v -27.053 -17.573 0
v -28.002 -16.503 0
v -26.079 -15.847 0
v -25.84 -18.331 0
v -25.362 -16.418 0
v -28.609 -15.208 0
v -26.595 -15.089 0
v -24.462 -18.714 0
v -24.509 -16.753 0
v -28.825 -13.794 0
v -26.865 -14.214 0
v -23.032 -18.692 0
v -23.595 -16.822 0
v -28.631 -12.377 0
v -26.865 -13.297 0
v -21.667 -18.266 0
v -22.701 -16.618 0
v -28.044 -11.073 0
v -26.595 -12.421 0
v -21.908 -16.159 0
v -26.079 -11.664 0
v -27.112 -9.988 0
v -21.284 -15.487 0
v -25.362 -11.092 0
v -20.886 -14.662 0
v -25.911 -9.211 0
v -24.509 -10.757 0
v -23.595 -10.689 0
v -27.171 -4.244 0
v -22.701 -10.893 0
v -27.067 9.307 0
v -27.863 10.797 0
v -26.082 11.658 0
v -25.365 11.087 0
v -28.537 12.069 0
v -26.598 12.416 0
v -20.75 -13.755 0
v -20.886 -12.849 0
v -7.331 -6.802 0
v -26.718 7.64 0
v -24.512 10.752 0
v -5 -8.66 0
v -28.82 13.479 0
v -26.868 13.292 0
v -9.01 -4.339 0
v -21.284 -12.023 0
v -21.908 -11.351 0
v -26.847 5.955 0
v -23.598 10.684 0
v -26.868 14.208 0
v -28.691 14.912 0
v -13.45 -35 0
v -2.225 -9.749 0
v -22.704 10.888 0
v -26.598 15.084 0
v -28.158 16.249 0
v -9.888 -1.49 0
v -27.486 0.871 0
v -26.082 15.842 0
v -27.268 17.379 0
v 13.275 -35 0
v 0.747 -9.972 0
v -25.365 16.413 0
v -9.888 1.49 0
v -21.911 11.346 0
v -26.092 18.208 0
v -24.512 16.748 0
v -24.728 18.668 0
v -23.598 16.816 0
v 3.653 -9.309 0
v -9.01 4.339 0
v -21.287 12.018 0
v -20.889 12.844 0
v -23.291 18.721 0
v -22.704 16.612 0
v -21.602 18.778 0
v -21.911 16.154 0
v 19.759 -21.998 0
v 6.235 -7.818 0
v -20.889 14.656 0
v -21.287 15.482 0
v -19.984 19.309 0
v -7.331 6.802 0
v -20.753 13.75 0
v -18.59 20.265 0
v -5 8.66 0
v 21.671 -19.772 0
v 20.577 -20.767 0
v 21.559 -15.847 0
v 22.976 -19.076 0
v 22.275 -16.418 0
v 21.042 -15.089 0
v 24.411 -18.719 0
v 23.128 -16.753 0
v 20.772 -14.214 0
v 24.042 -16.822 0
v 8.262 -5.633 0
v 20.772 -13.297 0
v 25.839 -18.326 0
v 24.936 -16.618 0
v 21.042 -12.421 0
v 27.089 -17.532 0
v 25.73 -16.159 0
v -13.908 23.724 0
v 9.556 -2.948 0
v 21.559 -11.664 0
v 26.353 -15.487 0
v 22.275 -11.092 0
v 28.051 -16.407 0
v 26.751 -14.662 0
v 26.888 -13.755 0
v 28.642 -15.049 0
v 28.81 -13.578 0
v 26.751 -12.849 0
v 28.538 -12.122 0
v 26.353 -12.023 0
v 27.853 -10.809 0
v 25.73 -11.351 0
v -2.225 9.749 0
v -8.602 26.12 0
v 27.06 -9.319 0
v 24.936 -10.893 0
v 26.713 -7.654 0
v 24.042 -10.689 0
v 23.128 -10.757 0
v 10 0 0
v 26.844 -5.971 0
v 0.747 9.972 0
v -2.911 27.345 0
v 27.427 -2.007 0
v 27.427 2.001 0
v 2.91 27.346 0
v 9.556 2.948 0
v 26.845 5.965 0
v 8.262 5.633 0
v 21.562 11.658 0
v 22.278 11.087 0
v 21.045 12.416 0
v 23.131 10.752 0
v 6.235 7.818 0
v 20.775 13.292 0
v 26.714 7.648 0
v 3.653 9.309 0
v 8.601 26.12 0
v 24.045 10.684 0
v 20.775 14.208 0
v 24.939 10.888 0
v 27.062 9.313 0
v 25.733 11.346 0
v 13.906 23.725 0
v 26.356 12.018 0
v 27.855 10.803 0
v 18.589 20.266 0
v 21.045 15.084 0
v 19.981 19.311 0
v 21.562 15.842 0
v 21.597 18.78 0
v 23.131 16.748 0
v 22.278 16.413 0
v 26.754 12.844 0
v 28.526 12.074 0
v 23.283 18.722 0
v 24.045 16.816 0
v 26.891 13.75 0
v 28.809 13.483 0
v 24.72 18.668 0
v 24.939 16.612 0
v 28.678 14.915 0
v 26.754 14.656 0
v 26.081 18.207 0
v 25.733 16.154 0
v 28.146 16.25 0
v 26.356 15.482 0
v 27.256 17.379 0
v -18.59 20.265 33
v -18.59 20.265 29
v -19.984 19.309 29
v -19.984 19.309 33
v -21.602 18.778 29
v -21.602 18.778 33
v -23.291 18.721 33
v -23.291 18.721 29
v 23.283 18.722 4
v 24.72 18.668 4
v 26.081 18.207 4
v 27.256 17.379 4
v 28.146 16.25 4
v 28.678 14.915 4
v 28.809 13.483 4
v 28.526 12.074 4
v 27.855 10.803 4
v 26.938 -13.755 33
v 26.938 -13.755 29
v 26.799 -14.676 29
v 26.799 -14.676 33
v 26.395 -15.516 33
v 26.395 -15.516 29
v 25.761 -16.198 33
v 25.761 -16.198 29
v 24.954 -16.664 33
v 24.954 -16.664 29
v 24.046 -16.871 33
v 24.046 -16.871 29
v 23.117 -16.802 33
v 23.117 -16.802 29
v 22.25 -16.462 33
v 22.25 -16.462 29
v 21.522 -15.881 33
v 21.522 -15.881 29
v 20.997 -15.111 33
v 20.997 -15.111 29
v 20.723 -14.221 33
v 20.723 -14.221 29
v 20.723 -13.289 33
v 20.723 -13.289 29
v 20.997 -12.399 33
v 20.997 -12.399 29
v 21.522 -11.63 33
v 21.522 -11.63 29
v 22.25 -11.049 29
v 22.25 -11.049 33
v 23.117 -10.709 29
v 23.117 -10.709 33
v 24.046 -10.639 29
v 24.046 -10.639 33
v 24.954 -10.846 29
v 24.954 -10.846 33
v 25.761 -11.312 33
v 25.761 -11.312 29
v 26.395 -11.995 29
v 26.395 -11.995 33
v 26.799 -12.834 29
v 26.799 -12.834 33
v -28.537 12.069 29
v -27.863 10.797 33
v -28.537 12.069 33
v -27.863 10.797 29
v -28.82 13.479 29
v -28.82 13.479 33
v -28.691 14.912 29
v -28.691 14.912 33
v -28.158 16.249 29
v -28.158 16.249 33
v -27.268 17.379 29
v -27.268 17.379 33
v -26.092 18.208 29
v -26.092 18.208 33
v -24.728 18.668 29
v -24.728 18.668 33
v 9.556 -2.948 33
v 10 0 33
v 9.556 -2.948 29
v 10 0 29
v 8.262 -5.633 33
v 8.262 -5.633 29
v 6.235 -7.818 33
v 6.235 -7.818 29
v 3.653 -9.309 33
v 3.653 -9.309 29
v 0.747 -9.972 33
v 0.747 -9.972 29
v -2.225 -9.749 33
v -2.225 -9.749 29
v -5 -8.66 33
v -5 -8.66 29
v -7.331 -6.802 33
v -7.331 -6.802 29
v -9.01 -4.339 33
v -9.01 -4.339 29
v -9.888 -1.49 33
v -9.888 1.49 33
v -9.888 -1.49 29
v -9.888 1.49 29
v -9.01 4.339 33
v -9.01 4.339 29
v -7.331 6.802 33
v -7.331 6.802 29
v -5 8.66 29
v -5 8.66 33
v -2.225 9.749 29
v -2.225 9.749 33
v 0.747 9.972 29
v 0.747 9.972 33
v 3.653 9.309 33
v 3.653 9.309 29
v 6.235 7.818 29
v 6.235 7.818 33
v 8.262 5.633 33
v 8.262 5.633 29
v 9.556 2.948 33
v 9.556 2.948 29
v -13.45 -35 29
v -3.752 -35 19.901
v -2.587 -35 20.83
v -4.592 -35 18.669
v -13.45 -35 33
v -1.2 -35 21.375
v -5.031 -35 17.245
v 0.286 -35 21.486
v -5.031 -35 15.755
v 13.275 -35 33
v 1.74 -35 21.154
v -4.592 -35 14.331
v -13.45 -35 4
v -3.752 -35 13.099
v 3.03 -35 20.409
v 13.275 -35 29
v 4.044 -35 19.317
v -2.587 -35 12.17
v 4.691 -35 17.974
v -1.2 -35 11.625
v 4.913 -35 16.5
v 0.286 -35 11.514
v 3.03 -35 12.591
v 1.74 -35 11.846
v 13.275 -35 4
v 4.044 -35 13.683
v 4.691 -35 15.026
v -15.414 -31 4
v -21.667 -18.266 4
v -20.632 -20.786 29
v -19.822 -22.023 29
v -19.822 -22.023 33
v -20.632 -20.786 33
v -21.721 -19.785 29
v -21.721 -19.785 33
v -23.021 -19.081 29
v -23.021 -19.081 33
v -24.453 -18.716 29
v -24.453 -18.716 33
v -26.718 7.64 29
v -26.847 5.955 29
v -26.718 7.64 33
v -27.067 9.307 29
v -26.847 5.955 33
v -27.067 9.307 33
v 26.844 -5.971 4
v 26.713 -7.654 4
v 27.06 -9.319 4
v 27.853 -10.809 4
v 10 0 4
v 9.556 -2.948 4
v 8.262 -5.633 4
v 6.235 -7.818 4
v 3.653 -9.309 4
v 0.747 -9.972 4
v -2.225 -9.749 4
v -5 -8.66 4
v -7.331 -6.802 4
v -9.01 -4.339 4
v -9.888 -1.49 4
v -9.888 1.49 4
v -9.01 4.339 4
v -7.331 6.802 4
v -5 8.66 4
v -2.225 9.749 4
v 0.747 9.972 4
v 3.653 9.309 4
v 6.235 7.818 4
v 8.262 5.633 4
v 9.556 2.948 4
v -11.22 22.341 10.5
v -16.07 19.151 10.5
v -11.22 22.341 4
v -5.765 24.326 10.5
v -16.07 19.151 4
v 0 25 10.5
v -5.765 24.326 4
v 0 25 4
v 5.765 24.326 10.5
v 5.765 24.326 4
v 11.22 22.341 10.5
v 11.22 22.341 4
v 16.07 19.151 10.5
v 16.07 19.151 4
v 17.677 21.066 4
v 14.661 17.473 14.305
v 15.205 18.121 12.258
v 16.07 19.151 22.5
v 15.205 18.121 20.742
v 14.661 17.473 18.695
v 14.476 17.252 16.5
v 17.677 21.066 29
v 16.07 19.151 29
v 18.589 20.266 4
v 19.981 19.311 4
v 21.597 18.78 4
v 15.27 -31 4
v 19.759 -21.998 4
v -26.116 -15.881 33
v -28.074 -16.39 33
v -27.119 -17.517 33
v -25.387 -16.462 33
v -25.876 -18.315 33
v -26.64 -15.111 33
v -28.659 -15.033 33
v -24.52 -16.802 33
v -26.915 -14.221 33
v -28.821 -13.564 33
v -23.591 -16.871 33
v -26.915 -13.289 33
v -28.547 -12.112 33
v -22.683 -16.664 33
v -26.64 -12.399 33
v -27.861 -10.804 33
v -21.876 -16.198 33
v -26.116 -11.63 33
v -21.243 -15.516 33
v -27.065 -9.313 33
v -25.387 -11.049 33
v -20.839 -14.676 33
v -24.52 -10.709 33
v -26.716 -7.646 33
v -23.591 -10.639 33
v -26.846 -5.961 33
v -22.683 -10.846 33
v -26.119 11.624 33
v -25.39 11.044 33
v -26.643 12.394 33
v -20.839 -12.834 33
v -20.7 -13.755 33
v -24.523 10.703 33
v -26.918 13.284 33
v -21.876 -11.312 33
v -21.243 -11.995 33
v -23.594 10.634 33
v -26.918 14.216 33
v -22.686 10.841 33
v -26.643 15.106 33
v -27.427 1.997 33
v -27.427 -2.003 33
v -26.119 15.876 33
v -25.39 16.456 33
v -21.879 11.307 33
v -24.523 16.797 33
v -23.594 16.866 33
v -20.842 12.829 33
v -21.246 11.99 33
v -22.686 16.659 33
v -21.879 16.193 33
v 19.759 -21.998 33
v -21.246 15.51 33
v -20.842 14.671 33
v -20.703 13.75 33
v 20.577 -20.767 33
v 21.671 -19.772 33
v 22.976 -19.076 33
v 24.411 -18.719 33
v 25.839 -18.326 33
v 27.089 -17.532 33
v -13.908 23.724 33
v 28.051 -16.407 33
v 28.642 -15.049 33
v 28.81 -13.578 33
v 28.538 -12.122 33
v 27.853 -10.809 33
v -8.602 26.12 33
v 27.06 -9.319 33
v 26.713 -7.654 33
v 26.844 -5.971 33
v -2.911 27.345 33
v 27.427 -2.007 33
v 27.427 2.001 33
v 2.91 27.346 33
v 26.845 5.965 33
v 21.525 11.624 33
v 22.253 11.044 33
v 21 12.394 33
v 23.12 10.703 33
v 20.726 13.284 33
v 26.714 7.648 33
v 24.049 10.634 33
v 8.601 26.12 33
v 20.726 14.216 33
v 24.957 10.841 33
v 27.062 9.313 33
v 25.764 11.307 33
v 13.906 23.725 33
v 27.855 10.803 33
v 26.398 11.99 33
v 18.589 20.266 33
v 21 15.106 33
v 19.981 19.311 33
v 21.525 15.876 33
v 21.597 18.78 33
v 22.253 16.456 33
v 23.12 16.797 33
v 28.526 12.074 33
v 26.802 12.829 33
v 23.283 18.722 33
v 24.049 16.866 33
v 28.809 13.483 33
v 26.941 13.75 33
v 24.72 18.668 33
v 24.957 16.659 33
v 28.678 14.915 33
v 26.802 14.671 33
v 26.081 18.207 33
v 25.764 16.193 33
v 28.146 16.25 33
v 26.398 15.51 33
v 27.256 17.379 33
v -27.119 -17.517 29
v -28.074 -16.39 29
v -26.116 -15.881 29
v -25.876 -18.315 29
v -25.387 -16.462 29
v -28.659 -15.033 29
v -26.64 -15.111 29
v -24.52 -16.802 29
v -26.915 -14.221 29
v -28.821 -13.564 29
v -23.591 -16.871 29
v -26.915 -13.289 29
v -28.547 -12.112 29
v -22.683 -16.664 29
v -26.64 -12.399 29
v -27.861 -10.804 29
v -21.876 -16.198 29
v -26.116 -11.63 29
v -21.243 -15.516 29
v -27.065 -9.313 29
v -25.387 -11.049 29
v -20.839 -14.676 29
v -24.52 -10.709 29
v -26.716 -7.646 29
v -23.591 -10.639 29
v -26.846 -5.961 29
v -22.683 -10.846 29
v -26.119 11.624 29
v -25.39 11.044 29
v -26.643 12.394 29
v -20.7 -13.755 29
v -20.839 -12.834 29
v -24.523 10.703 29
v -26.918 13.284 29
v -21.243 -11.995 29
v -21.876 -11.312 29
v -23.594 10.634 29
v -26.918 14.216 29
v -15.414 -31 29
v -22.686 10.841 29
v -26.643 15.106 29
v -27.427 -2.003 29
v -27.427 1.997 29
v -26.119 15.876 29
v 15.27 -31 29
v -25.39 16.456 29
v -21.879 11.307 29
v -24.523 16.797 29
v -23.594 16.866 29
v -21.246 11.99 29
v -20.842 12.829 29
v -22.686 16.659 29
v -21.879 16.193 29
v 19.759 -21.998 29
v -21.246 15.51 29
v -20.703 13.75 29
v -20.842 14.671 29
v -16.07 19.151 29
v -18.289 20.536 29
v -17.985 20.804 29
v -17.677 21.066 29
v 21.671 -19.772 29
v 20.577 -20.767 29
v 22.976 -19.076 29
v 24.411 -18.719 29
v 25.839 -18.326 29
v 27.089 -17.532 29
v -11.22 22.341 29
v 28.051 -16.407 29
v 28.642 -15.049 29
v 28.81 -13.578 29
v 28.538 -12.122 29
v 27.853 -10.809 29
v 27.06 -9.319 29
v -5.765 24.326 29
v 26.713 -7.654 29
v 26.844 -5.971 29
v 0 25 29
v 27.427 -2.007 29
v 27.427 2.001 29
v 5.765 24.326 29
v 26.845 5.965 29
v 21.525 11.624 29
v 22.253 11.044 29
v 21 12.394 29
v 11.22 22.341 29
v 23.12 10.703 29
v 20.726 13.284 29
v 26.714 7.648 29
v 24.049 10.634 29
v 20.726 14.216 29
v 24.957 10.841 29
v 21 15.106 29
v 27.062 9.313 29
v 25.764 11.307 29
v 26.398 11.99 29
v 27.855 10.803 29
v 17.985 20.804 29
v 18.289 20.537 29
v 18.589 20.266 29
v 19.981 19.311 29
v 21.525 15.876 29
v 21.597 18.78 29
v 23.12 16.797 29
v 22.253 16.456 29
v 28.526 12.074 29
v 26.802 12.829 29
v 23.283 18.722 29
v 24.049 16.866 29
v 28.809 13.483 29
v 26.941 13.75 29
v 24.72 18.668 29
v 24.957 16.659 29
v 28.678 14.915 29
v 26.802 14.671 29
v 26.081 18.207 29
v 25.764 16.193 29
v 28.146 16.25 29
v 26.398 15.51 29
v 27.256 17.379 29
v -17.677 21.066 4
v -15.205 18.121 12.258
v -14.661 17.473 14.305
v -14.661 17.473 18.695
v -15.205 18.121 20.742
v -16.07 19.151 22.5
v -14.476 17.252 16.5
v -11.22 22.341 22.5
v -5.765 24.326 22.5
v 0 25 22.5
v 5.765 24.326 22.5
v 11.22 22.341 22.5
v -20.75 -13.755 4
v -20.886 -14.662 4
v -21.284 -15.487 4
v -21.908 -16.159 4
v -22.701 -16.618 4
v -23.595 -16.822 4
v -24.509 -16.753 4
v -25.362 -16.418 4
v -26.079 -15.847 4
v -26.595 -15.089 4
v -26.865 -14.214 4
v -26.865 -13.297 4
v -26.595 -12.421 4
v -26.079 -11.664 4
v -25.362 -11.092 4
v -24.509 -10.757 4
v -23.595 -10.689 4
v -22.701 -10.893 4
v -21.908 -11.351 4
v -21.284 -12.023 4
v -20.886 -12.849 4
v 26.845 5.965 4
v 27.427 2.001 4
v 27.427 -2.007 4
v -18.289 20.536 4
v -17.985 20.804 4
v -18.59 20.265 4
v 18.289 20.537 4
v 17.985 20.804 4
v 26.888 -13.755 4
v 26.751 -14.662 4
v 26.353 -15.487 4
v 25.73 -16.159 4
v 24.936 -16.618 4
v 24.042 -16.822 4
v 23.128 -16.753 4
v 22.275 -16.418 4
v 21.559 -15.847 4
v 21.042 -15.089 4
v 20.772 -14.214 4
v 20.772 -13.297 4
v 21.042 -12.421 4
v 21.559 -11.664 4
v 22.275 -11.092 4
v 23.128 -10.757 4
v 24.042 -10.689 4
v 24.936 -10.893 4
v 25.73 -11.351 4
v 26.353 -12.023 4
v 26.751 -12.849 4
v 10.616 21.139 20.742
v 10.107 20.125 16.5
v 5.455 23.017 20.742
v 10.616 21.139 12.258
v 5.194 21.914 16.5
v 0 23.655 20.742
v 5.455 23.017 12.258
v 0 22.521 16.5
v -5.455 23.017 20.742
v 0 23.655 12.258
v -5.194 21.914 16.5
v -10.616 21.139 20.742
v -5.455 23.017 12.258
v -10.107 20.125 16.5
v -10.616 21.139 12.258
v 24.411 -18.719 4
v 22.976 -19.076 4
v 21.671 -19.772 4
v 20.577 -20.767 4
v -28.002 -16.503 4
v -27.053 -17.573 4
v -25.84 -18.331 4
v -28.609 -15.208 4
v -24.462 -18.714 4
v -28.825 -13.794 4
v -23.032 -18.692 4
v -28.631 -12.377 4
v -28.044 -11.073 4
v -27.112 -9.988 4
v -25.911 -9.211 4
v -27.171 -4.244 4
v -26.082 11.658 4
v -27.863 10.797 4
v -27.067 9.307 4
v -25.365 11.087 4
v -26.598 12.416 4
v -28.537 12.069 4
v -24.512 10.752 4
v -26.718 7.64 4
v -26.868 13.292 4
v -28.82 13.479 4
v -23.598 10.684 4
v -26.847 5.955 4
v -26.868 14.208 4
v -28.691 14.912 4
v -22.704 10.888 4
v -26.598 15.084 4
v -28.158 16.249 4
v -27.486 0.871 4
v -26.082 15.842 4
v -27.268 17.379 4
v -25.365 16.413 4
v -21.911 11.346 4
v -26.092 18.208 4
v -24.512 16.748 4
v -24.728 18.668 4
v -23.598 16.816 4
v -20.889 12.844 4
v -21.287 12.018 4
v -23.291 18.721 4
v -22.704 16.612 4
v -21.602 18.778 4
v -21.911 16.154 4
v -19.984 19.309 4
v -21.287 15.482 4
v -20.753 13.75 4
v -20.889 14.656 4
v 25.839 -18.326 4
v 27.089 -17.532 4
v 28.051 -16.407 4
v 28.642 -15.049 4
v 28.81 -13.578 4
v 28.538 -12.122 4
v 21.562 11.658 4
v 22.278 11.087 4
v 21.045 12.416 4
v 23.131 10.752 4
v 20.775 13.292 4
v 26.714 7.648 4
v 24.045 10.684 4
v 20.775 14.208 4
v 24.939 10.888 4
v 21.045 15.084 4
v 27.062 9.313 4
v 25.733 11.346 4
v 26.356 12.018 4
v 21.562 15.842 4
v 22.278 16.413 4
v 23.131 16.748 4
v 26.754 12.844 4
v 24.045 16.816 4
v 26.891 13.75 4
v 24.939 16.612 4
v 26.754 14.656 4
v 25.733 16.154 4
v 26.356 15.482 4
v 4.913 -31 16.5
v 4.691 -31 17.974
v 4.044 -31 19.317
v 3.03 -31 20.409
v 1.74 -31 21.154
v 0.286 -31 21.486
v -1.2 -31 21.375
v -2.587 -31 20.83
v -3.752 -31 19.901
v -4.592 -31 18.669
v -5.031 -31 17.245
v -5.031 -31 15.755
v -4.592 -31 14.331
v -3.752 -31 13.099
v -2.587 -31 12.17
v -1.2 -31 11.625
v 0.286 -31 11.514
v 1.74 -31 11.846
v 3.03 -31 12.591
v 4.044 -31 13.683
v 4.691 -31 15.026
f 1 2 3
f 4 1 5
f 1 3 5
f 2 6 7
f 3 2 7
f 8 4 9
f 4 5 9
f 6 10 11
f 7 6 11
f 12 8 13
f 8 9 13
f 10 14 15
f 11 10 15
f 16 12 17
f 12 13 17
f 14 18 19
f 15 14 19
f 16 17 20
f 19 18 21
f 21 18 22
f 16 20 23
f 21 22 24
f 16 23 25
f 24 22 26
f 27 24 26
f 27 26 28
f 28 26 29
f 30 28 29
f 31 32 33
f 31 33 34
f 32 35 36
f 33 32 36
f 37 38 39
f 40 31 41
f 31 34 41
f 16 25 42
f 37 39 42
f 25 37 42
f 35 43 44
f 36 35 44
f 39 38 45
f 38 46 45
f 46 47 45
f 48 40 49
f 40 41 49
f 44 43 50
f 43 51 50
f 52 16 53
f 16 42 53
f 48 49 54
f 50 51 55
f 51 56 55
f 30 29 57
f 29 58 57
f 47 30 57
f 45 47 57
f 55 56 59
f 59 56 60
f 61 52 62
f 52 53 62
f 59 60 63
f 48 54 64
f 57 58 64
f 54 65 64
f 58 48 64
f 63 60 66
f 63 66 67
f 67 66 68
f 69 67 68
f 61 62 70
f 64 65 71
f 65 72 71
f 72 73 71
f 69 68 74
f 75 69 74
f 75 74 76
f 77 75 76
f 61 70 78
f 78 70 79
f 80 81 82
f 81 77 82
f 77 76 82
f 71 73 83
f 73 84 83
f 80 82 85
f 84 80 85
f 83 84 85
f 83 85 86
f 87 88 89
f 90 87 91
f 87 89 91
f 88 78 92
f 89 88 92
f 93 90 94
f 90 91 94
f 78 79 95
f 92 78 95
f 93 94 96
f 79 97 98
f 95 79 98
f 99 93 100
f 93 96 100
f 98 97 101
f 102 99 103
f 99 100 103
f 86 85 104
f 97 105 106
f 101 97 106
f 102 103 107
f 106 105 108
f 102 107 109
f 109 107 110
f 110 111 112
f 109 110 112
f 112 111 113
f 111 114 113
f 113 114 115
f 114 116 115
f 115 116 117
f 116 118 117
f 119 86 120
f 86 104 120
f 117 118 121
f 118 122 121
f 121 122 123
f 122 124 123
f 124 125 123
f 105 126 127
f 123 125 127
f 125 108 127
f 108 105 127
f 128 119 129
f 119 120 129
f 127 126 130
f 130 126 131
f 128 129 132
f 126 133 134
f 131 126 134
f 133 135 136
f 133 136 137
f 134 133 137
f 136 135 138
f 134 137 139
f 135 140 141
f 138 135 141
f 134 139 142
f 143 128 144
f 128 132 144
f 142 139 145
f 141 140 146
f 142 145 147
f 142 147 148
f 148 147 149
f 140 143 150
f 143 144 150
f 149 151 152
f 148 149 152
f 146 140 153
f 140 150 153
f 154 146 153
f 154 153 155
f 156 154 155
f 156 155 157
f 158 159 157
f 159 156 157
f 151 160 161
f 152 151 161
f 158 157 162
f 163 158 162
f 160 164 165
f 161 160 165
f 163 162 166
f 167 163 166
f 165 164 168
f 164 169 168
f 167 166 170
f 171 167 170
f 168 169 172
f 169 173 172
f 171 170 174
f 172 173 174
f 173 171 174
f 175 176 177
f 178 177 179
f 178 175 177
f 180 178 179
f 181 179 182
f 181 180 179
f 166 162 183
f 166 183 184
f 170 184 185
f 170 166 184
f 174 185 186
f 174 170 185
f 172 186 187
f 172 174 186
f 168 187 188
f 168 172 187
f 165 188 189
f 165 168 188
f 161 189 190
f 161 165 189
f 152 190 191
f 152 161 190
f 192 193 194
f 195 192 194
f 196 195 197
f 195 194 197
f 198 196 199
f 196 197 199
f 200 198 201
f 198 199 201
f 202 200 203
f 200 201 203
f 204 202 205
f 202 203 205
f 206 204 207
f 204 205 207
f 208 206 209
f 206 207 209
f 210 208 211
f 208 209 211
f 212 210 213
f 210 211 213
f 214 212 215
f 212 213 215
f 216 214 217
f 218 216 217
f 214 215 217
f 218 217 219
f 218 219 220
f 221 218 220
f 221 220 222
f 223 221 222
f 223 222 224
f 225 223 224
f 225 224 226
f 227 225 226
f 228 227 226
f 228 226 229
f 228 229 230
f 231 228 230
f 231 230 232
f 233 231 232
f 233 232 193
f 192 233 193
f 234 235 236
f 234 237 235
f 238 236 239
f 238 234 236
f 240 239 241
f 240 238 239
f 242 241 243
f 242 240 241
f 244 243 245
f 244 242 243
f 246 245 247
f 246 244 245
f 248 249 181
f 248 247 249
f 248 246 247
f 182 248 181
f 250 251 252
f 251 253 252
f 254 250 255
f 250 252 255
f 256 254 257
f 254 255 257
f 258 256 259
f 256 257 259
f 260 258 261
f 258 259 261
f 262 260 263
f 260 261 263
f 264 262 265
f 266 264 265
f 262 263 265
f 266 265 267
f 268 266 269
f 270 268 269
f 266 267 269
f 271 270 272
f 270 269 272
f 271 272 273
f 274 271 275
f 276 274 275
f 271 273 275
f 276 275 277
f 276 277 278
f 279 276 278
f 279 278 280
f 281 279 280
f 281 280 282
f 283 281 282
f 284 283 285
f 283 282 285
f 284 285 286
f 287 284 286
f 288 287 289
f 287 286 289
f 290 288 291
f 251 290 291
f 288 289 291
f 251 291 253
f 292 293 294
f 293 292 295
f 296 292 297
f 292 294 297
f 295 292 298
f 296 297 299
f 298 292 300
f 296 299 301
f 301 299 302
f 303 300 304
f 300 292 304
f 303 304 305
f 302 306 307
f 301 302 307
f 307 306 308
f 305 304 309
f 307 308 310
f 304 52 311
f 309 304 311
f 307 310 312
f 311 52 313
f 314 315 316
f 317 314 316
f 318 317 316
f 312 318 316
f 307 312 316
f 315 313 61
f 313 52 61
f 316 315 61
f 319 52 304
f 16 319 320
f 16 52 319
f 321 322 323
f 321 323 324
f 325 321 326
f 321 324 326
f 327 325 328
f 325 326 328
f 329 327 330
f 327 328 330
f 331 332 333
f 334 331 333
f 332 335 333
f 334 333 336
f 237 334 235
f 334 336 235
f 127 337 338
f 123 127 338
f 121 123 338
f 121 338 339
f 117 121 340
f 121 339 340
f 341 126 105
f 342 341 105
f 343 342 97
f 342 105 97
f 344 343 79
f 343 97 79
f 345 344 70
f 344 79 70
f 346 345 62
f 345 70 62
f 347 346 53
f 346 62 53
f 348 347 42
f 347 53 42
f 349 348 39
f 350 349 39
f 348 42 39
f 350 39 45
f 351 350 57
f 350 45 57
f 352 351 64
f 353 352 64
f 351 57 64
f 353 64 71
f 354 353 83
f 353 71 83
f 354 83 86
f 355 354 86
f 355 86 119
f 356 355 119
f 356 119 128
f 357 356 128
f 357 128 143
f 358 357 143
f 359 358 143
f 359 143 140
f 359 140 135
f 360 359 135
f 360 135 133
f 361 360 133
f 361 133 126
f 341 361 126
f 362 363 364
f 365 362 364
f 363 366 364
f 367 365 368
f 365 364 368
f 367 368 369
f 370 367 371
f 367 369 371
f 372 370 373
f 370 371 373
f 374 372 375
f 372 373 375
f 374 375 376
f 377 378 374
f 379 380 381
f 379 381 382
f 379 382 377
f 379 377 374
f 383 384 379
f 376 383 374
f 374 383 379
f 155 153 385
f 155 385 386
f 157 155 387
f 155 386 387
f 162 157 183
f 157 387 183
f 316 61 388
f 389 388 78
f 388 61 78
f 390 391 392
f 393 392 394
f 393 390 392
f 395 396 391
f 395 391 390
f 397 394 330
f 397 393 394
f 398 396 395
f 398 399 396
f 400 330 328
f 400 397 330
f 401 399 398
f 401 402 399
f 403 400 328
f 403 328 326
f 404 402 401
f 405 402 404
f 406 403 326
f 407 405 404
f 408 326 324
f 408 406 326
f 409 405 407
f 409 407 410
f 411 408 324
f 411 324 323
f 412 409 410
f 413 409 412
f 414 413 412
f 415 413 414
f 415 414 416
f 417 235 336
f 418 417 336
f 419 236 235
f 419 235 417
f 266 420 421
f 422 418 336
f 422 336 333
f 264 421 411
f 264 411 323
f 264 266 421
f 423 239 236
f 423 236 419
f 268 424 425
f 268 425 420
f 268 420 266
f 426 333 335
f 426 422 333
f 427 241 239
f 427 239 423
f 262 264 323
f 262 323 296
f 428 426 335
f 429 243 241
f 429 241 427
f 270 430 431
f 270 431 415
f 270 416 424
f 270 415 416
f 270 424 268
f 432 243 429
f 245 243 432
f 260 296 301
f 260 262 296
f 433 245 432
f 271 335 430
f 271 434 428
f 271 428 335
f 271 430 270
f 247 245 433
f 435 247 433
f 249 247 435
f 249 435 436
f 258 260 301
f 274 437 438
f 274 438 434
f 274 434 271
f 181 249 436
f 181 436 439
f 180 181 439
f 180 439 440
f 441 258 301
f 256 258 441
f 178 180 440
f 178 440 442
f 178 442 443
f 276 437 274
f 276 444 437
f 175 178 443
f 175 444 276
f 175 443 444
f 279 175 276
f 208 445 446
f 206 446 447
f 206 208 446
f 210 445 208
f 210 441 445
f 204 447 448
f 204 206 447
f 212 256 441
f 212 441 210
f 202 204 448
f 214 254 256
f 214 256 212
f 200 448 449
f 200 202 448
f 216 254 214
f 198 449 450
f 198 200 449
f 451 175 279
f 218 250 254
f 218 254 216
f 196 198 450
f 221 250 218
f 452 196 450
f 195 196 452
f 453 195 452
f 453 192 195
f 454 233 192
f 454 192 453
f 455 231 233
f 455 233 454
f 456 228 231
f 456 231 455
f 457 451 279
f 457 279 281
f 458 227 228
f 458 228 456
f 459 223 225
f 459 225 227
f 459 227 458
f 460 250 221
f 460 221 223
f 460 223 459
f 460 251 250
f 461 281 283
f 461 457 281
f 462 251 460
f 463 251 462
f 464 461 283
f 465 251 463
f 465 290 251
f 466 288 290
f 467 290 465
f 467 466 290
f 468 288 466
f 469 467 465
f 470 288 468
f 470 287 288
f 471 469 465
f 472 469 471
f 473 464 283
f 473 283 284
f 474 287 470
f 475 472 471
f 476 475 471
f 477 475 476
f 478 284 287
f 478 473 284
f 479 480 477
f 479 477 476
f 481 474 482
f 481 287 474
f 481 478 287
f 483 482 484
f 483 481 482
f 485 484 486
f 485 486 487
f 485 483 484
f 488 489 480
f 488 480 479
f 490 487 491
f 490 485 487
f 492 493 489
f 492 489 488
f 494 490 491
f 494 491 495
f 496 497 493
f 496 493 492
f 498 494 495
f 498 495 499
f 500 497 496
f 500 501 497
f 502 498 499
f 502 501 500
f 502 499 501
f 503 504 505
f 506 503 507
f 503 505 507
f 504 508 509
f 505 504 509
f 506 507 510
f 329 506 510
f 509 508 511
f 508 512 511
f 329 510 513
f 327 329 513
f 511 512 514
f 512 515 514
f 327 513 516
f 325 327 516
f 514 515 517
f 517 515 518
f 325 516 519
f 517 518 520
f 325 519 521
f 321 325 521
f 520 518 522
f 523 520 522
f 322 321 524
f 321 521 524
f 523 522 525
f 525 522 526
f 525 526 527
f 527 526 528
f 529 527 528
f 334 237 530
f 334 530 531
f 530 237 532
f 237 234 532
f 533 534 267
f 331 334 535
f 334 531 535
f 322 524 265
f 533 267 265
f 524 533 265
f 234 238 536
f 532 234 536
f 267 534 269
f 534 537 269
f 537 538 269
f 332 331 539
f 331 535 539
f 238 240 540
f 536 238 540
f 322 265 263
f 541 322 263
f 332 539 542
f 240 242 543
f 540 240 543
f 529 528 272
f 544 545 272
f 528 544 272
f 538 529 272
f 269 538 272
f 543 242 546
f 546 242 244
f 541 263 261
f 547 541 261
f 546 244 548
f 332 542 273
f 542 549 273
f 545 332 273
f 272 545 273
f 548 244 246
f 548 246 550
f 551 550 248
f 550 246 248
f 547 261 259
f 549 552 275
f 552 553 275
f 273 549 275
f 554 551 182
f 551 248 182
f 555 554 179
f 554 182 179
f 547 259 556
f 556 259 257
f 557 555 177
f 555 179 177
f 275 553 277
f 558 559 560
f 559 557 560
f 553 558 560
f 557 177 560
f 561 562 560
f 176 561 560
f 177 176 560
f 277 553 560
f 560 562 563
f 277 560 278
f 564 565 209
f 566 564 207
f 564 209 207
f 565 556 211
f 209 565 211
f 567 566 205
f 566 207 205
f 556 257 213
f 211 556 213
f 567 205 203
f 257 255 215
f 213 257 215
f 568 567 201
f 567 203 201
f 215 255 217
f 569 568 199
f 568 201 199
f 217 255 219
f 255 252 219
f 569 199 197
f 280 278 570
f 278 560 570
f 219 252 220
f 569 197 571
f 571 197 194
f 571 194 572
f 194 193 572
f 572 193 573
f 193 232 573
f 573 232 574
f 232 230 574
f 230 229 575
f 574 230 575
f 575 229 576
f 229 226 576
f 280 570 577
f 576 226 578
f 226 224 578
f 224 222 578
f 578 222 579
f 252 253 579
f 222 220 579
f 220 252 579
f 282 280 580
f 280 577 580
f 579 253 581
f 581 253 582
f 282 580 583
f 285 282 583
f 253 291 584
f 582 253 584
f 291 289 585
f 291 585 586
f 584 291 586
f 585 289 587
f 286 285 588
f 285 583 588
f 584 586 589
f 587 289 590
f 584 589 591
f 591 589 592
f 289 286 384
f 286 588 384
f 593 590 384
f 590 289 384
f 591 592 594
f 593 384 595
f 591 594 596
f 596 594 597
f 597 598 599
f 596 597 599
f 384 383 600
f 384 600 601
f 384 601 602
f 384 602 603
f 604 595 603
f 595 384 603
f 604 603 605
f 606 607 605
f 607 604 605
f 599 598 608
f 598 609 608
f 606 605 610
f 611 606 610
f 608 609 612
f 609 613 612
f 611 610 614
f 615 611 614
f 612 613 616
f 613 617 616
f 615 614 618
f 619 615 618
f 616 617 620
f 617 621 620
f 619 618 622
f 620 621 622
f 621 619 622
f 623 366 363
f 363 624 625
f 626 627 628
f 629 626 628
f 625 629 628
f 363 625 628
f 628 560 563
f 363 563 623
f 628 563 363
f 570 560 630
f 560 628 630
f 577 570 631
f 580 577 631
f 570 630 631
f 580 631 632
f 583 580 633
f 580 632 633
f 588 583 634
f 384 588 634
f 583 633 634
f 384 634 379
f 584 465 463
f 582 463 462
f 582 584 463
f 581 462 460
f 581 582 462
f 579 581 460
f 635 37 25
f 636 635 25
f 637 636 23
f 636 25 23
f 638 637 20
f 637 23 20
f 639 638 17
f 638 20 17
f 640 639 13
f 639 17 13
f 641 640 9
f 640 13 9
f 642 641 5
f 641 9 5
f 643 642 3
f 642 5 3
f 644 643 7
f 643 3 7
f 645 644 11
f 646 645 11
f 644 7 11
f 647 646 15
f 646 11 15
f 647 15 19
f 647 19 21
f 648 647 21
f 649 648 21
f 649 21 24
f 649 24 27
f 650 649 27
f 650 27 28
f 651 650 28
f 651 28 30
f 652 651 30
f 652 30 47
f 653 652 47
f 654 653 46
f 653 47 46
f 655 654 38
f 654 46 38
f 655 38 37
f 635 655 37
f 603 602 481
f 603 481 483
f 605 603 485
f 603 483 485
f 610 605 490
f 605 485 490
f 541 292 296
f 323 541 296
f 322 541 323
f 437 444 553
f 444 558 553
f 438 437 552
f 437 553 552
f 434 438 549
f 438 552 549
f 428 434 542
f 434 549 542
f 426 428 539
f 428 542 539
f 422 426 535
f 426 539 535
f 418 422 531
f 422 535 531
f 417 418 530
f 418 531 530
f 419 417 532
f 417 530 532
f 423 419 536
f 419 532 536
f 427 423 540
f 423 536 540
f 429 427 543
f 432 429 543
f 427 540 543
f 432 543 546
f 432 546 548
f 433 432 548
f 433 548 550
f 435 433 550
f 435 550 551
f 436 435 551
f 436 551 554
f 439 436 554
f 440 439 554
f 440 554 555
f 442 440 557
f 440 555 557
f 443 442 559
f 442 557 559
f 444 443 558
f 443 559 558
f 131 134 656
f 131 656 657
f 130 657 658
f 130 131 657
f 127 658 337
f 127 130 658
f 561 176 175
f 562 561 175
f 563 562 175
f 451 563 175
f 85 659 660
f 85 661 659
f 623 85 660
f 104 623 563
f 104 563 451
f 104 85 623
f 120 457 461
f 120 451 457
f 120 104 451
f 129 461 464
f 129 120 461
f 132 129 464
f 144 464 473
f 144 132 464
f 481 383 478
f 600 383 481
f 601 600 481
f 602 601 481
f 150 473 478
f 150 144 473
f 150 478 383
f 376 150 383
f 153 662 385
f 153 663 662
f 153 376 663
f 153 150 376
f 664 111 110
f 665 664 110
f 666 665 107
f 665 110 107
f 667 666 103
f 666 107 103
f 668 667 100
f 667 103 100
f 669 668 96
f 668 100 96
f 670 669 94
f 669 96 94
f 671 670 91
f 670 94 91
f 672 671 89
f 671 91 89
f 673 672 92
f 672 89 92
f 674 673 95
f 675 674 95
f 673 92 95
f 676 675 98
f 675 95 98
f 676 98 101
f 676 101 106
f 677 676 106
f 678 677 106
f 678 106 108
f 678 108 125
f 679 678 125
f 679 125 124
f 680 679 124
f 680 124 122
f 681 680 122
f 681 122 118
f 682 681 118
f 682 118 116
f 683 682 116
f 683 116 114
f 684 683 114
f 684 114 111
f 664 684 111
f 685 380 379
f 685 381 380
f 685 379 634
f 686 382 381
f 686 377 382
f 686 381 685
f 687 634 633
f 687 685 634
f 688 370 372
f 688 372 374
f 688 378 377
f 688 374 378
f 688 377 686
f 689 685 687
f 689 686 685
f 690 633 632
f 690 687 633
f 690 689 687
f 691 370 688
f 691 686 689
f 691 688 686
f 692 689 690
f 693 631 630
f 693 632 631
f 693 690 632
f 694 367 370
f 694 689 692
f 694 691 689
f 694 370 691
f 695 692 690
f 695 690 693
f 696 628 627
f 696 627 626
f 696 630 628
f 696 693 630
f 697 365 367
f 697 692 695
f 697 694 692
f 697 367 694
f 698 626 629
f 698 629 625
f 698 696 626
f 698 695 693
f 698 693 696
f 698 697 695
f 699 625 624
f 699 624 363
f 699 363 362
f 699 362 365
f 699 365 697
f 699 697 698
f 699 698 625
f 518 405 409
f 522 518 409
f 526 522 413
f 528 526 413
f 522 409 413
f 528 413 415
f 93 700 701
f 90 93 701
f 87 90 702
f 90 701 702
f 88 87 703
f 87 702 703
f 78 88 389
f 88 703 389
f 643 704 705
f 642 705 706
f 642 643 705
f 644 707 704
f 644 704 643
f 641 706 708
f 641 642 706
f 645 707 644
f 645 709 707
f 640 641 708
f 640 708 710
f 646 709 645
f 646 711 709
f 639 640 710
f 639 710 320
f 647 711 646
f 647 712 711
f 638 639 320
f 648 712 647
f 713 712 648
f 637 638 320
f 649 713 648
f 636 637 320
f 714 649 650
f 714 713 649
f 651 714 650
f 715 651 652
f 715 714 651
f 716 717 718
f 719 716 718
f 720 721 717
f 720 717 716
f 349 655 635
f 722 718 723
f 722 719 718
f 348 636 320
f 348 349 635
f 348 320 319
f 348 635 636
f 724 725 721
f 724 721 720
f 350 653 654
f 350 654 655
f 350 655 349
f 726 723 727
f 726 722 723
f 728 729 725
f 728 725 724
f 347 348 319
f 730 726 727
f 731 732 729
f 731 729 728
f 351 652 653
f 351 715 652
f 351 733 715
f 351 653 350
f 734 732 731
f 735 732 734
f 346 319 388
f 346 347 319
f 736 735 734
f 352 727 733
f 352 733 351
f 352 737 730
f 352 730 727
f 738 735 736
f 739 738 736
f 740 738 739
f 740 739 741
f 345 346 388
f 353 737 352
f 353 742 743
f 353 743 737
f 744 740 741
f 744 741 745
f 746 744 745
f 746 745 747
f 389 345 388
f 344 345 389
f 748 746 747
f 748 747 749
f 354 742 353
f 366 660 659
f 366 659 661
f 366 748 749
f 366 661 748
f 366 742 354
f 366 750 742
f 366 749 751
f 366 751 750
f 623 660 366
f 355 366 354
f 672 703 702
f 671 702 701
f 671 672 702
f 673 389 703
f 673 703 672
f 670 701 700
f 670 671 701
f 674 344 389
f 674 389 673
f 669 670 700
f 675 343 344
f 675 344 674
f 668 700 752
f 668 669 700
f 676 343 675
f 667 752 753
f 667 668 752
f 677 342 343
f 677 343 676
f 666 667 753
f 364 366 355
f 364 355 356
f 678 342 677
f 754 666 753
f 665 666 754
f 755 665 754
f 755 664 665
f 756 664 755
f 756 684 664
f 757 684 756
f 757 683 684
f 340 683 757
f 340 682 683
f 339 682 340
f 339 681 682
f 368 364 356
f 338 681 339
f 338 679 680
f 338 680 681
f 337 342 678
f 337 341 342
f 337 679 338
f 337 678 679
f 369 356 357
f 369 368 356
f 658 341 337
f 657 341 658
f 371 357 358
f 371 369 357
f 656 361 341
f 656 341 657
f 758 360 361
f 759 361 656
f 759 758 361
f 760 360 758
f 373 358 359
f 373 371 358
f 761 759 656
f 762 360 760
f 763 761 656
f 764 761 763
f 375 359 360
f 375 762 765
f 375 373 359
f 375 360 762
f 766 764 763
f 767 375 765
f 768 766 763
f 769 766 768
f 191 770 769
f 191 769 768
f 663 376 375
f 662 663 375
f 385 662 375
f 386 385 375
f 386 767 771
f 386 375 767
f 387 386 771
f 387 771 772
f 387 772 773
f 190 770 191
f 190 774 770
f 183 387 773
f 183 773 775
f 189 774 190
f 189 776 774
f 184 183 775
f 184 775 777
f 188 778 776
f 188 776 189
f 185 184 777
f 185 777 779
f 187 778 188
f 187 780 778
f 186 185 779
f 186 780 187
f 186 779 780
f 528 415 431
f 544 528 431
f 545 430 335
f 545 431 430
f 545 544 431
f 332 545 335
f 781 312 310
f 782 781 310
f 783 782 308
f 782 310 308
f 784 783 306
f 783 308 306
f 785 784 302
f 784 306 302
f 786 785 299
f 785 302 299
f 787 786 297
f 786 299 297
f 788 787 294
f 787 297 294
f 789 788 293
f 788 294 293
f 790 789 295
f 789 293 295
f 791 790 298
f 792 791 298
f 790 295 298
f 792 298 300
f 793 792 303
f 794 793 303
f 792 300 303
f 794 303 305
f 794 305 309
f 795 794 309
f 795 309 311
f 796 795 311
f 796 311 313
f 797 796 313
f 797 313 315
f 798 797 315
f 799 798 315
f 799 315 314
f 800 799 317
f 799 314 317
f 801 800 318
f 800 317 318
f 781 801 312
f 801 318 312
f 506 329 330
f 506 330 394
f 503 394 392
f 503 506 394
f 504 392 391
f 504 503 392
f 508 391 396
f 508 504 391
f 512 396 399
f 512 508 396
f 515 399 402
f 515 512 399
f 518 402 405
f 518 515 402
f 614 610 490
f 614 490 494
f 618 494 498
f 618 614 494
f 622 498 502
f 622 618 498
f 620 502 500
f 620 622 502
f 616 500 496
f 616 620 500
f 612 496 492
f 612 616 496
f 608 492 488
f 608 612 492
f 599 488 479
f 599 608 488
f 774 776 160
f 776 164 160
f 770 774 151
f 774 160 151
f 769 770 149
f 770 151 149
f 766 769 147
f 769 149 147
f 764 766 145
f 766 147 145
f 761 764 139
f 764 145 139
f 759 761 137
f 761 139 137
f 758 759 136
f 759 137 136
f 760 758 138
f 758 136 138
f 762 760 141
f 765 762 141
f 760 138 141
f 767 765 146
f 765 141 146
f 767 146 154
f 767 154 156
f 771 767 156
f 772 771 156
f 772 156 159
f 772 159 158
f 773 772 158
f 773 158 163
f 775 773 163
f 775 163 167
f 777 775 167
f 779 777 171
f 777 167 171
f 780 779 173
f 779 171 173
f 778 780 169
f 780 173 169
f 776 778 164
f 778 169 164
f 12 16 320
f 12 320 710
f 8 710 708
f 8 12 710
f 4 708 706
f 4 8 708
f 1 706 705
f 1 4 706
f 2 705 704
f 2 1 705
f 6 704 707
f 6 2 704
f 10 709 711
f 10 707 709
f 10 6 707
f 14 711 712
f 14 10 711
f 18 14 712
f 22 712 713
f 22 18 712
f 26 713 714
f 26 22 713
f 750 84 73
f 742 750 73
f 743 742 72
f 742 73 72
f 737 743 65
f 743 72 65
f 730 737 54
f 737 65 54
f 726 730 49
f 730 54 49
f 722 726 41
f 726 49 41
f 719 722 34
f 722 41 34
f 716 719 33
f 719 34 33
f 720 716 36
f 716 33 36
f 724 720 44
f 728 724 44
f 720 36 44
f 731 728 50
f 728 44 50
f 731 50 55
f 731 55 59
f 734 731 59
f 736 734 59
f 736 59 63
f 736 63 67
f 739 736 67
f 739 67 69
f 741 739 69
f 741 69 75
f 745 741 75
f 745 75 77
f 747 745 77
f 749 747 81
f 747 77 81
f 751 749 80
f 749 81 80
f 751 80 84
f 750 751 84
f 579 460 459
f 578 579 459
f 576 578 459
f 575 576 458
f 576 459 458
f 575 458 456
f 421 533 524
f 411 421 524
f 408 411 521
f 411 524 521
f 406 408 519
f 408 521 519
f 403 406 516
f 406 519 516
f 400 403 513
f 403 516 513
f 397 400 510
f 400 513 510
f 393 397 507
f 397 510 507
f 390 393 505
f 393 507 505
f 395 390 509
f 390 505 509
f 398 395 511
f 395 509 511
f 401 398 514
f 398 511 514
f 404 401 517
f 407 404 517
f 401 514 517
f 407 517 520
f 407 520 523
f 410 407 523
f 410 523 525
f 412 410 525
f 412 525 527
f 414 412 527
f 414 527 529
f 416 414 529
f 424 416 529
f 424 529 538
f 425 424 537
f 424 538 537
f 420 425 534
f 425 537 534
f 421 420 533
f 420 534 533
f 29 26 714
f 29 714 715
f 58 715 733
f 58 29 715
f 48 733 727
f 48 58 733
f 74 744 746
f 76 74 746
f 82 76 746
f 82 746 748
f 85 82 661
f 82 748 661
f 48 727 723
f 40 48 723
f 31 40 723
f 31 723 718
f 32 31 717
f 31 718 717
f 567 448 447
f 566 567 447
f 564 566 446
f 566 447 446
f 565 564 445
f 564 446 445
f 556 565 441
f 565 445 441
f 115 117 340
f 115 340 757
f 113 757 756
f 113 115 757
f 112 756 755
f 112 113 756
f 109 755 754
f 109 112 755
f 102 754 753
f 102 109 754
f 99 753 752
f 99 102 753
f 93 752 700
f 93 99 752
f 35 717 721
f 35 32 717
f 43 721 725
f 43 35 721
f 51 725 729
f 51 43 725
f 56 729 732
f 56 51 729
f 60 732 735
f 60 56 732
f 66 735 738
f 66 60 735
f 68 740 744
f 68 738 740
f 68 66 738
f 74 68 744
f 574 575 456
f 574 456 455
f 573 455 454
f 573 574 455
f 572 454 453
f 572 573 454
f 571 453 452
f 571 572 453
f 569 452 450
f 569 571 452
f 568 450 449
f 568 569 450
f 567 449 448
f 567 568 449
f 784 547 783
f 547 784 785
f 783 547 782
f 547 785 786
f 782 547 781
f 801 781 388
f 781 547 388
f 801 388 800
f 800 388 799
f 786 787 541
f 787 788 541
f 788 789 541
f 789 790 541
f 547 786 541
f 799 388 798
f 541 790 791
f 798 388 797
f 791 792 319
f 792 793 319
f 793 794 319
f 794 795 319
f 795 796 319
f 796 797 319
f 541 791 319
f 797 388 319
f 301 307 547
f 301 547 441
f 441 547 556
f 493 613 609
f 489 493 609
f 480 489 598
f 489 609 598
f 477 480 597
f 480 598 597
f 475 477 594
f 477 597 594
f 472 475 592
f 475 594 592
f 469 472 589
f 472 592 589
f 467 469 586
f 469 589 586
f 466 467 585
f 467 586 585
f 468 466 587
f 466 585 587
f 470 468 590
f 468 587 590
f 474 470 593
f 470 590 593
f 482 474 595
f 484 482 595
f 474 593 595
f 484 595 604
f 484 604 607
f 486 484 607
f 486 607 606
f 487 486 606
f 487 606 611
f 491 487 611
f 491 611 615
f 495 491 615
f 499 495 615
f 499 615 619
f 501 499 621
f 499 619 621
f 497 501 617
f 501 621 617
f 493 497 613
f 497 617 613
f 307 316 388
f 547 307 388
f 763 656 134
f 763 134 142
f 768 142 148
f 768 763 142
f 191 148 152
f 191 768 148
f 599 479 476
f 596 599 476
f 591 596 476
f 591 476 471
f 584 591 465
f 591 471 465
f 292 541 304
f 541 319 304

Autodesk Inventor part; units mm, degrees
ref_plane "YZ Plane" through (0, 0, 0) normal (1, 0, 0) x (0, 1, 0)
ref_plane "XZ Plane" through (0, 0, 0) normal (0, 1, 0) x (-1, 0, 0)
ref_plane "XY Plane" through (0, 0, 0) normal (0, 0, 1) x (1, 0, 0)
sketch "Sketch1" plane through (0, 0, 0) normal (0, 0, 1) x (1, 0, 0)
  line L0 (-13.5571, -30) -> (11.7429, -30) construction
  line L1 (11.7429, -30) -> (11.7429, -13.7014) construction
  line L2 (11.7429, -13.7014) -> (-13.5571, -13.7014) construction
  line L3 (-13.5571, -13.7014) -> (-13.5571, -30) construction
  circle A0 centre (0, 0) radius 10
  circle A1 centre (0, 0) radius 23.5 construction
  line L4 (11.7429, -30) -> (21.2173, -10.1032) construction
  line L5 (-13.5571, -30) -> (-21.9053, -8.5093) construction
  circle A2 centre (0, 0) radius 27.5
  line L6 (-13.4496, -35) -> (13.2752, -35)
  line L7 (-13.4496, -35) -> (-24.6844, -12.1216)
  line L8 (13.2752, -35) -> (24.6094, -12.273)
  circle A3 centre (23.8157, 13.75) radius 5
  line L9 (-0.006, -0.0035) -> (23.8157, 13.75) construction
  line L10 (-0.006, -0.0035) -> (30.724, -0.0035) construction
  line L11 (-0.006, -0.0035) -> (23.8127, -13.7552) construction
  circle A4 centre (23.8127, -13.7552) radius 5
  circle A5 centre (23.8157, 13.75) radius 3.075
  circle A6 centre (23.8127, -13.7552) radius 3.075
  line L12 (-0.006, -0.0035) -> (-0.006, 21.9972)
  circle A7 centre (-23.8278, 13.75) radius 5
  circle A8 centre (-23.8248, -13.7552) radius 5
  circle A9 centre (-23.8278, 13.75) radius 3.075
  circle A10 centre (-23.8248, -13.7552) radius 3.075
  point P0 (20.9324, 17.8349)
  point P1 (-20.9369, 17.8296)
  point P2 (-25.9134, 9.2058)
  point P3 (-25.9114, -9.2114)
  point P4 (-21.6672, -18.2658)
  point P5 (21.6274, -18.2524)
  point P6 (25.9097, -9.2162)
  point P7 (25.9117, 9.2105)
  dimension "d0" = 25.3
  dimension "d1" = 20
  dimension "d2" = 30
  dimension "d3" = 47
  dimension "d4" = 55
  dimension "d5" = 5
  dimension "d45" = 30
  dimension "d46" = 10
  dimension "d47" = 30
  dimension "d48" = 10
  dimension "d49" = 6.15
  dimension "d50" = 6.15
  dimension "d64" = 6.15
extrude "Extrusion1" add sketch "Sketch1" along normal blind 4 contours A2 A4 A8 A7 A3 | A3 A2 A5 | A2 A5 A3 | A4 L8 A6 A2 | A2 A6 A4 | A4 L8 L6 L7 A8 A2 | A2 A6 L8 A4 | A7 A2 A9 | A2 A9 A7 | A8 L7 A10 A2 | A2 A10 A8 | A8 A2 A10 L7
sketch "Sketch2" plane through (0, 0, 4) normal (0, 0, 1) x (1, 0, 0)
  line L0 (-21.6672, -18.2658) -> (-13.4496, -35) projected
  line L1 (-13.4496, -35) -> (-15.4139, -31)
  line L2 (15.2701, -31) -> (-15.4139, -31)
  line L3 (13.2752, -35) -> (21.6274, -18.2524) projected
  line L4 (15.2701, -31) -> (13.2752, -35)
  line L5 (-13.4496, -35) -> (13.2752, -35) projected
  line L6 (-13.4496, -35) -> (13.2752, -35)
  point P0 (0, 0)
  point P1 (-24.6844, -12.1216)
  point P2 (24.6094, -12.273)
  dimension "d8" = 4
extrude "Extrusion2" add sketch "Sketch2" along normal blind 25
sketch "Sketch3" plane through (0, 0, 29) normal (0, 0, 1) x (1, 0, 0)
  line L0 (-13.5571, -30) -> (11.7429, -30) construction
  line L1 (11.7429, -30) -> (11.7429, -13.7014) construction
  line L2 (11.7429, -13.7014) -> (-13.5571, -13.7014) construction
  line L3 (-13.5571, -13.7014) -> (-13.5571, -30) construction
  circle A0 centre (0, 0) radius 10
  circle A1 centre (0, 0) radius 23.5 construction
  line L4 (11.7429, -30) -> (21.2173, -10.1032) construction
  line L5 (-13.5571, -30) -> (-21.9053, -8.5093) construction
  circle A2 centre (0, 0) radius 27.5
  line L6 (-13.4496, -35) -> (13.2752, -35)
  line L7 (-13.4496, -35) -> (-24.6844, -12.1216)
  line L8 (13.2752, -35) -> (24.6094, -12.273)
  circle A3 centre (23.8157, 13.75) radius 5
  line L9 (-0.006, -0.0035) -> (23.8157, 13.75) construction
  line L10 (-0.006, -0.0035) -> (30.724, -0.0035) construction
  line L11 (-0.006, -0.0035) -> (23.8127, -13.7552) construction
  circle A4 centre (23.8127, -13.7552) radius 5
  circle A5 centre (23.8157, 13.75) radius 3.125
  circle A6 centre (23.8127, -13.7552) radius 3.125
  line L12 (-0.006, -0.0035) -> (-0.006, 21.9972)
  circle A7 centre (-23.8278, 13.75) radius 5
  circle A8 centre (-23.8278, 13.75) radius 3.125
  circle A9 centre (-23.8248, -13.7552) radius 5
  circle A10 centre (-23.8248, -13.7552) radius 3.125
  circle A11 centre (0, 0) radius 10 projected
  point P0 (-42.8581, 50.0798)
  point P1 (-84.7274, 50.0745)
  point P2 (-89.7039, 41.4507)
  point P3 (-89.7018, 23.0335)
  point P4 (-85.4577, 13.9792)
  point P5 (-42.163, 13.9925)
  point P6 (-37.8808, 23.0287)
  point P7 (-37.8788, 41.4554)
  point P8 (20.9324, 17.8349)
  point P9 (-20.9369, 17.8296)
  point P10 (-25.9134, 9.2058)
  point P11 (-25.9114, -9.2114)
  point P12 (-21.6672, -18.2658)
  point P13 (21.6274, -18.2524)
  point P14 (20.9285, -17.8395)
  point P15 (22.0984, -16.368)
  point P16 (25.2195, -10.9648)
  point P17 (25.9117, 9.2105)
  point P18 (25.9097, -9.2162)
  dimension "d51" = 25.3
  dimension "d52" = 20
  dimension "d53" = 30
  dimension "d54" = 47
  dimension "d55" = 55
  dimension "d56" = 5
  dimension "d57" = 30
  dimension "d58" = 10
  dimension "d59" = 30
  dimension "d60" = 10
  dimension "d61" = 6.25
  dimension "d62" = 6.25
extrude "Extrusion3" add sketch "Sketch3" along normal blind 4 contours A2 A4 A9 A7 A3 | A3 A2 A5 | A2 A5 A3 | A4 L8 A6 A2 | A2 A6 A4 | A4 L8 L6 L7 A9 A2 | A2 A6 L8 A4 | A7 A2 A8 | A2 A8 A7 | A9 L7 A10 A2 | A2 A10 A9 | A9 A2 A10 L7
sketch "Sketch4" plane through (0, 0, 0) normal (1, 0, 0) x (0, 1, 0)
  line L0 (-31, 4) -> (-31, 29) projected
  line L1 (16.3793, 67.7391) -> (20.3793, 67.7391) construction
  line L2 (20.3793, 44.4757) -> (20.3793, 67.7391) construction
  line L3 (20.3793, 44.4757) -> (16.3793, 44.4757) construction
  line L4 (0, 24) -> (0, 4)
  line L5 (16.3793, 44.4757) -> (16.3793, 48.4757) construction
  line L6 (16.3793, 67.7391) -> (16.3793, 63.7391) construction
  arc A0 (16.3793, 63.7391) -> (16.3793, 48.4757) centre (22.0199, 56.1074) ccw construction
  line L7 (27.5, 4) -> (17.8296, 4) projected
  line L8 (27.5, 29) -> (27.5, 33)
  line L9 (27.5, 29) -> (-12.273, 29)
  line L10 (27.5, 29) -> (25, 29)
  line L11 (25, 29) -> (25, 22.5)
  arc A1 (25, 22.5) -> (25, 10.5) centre (31.0208, 16.5) ccw
  line L12 (25, 10.5) -> (25, 4)
  line L13 (27.5, 4) -> (25, 4)
  line L14 (25, 29) -> (27.5, 29)
  line L15 (27.5, 4) -> (27.5, 29)
  line L16 (27.5, 4) -> (17.8296, 4) projected
  line L17 (27.5, 4) -> (25, 4)
  point P0 (0, 0)
  point P1 (-12.1216, 29)
  point P2 (-12.1216, 4)
  point P3 (-12.273, 29)
  point P4 (25, 7.25)
  point P5 (17.8349, 4)
  point P6 (9.2058, 4)
  point P7 (-9.2114, 4)
  dimension "d22" = 4
  dimension "d23" = 4
  dimension "d24" = 4
  dimension "d26" = 6.5
  dimension "d28" = 6.5
  dimension "d65" = 2.5
  dimension "d66" = 2.5
revolve "Revolution1" add sketch "Sketch4" angle 80 mid plane about axis through (0, 0, 24) along (0, 0, -1)
sketch "Sketch5" plane through (0, 0, 0) normal (0, 1, 0) x (-1, 0, 0)
  line L0 (0, 0) -> (0.0872, 33)
sketch "Sketch7" plane through (0, 0, 0) normal (1, 0, 0) x (0, 1, 0)
  line L0 (29.2747, 11.9493) -> (29.2747, 21.0264) construction
  ellipse E0 centre (23.7633, 16.5) end of major axis (23.7633, 8) minor radius 6.5114 (19.1511, 22.5) -> (19.1511, 10.5) ccw projected
  line L1 (29.2747, 16.4878) -> (30.2747, 16.4878)
  arc A0 (29.2747, 11.9493) -> (29.2747, 21.0264) centre (45.8325, 16.4878) ccw
  arc A1 (30.2415, 15.6424) -> (30.2747, 16.4878) centre (23.4449, 16.3328) ccw
  line L2 (29.2747, 21.0264) -> (27.6139, 21.0264)
  line L3 (27.6139, 21.0264) -> (27.6139, 13.9093)
  line L4 (27.6139, 13.9093) -> (29.2747, 13.9093)
  line L5 (29.2747, 13.9093) -> (29.2747, 21.0264)
  point P0 (0, 0)
  point P1 (13.8599, 14.7128)
  point P2 (13.8237, 14.0101)
  point P3 (14.8237, 10.4516)
  dimension "d29" = 1
extrude "Extrusion4" [suppressed]
sketch "Sketch9" plane through (-13.4496, -35, 0) normal (0, -1, 0) x (1, 0, 0)
  circle A0 centre (13.3624, 16.5) radius 5
  line L0 (0, 33) -> (26.7249, 33)
  line L1 (0, 0) -> (0, 29) projected
  line L2 (26.7249, 0) -> (26.7249, 29) projected
  line L3 (0, 0) -> (26.7249, 0) projected
  point P0 (13.4496, 0)
  dimension "d34" = 16.5
  dimension "d35" = 13.3624
  dimension "d36" = 26.7249
  dimension "d37" = 10
  dimension "d44" = 33
extrude "Extrusion5" cut sketch "Sketch9" against normal up to surface (4 mm away)
ref_plane "Work Plane1" through (16.0697, 19.1511, 29) normal (-1, 0, 0) x (0, 0, -1)
sketch "Sketch11" plane through (0, 0, 33) normal (0, 0, 1) x (1, 0, 0)
  point P0 (0, 0)
fillet "Fillet3" radius 6 14 edges at (20.9324, 17.8349, 31) (20.9324, 17.8349, 2) (25.9117, 9.2105, 31) (25.9117, 9.2105, 2) (25.9097, -9.2162, 2) (21.6274, -18.2524, 2) (-25.9134, 9.2058, 31) (-25.9134, 9.2058, 2) (-20.9369, 17.8296, 2) (-20.9369, 17.8296, 31) (-25.9114, -9.2114, 31) (-21.6672, -18.2658, 31) (25.9097, -9.2162, 31) (21.6274, -18.2524, 31)
equation "\"d35\" = 0.5 * d36"
properties part number "pulleyblocker"
